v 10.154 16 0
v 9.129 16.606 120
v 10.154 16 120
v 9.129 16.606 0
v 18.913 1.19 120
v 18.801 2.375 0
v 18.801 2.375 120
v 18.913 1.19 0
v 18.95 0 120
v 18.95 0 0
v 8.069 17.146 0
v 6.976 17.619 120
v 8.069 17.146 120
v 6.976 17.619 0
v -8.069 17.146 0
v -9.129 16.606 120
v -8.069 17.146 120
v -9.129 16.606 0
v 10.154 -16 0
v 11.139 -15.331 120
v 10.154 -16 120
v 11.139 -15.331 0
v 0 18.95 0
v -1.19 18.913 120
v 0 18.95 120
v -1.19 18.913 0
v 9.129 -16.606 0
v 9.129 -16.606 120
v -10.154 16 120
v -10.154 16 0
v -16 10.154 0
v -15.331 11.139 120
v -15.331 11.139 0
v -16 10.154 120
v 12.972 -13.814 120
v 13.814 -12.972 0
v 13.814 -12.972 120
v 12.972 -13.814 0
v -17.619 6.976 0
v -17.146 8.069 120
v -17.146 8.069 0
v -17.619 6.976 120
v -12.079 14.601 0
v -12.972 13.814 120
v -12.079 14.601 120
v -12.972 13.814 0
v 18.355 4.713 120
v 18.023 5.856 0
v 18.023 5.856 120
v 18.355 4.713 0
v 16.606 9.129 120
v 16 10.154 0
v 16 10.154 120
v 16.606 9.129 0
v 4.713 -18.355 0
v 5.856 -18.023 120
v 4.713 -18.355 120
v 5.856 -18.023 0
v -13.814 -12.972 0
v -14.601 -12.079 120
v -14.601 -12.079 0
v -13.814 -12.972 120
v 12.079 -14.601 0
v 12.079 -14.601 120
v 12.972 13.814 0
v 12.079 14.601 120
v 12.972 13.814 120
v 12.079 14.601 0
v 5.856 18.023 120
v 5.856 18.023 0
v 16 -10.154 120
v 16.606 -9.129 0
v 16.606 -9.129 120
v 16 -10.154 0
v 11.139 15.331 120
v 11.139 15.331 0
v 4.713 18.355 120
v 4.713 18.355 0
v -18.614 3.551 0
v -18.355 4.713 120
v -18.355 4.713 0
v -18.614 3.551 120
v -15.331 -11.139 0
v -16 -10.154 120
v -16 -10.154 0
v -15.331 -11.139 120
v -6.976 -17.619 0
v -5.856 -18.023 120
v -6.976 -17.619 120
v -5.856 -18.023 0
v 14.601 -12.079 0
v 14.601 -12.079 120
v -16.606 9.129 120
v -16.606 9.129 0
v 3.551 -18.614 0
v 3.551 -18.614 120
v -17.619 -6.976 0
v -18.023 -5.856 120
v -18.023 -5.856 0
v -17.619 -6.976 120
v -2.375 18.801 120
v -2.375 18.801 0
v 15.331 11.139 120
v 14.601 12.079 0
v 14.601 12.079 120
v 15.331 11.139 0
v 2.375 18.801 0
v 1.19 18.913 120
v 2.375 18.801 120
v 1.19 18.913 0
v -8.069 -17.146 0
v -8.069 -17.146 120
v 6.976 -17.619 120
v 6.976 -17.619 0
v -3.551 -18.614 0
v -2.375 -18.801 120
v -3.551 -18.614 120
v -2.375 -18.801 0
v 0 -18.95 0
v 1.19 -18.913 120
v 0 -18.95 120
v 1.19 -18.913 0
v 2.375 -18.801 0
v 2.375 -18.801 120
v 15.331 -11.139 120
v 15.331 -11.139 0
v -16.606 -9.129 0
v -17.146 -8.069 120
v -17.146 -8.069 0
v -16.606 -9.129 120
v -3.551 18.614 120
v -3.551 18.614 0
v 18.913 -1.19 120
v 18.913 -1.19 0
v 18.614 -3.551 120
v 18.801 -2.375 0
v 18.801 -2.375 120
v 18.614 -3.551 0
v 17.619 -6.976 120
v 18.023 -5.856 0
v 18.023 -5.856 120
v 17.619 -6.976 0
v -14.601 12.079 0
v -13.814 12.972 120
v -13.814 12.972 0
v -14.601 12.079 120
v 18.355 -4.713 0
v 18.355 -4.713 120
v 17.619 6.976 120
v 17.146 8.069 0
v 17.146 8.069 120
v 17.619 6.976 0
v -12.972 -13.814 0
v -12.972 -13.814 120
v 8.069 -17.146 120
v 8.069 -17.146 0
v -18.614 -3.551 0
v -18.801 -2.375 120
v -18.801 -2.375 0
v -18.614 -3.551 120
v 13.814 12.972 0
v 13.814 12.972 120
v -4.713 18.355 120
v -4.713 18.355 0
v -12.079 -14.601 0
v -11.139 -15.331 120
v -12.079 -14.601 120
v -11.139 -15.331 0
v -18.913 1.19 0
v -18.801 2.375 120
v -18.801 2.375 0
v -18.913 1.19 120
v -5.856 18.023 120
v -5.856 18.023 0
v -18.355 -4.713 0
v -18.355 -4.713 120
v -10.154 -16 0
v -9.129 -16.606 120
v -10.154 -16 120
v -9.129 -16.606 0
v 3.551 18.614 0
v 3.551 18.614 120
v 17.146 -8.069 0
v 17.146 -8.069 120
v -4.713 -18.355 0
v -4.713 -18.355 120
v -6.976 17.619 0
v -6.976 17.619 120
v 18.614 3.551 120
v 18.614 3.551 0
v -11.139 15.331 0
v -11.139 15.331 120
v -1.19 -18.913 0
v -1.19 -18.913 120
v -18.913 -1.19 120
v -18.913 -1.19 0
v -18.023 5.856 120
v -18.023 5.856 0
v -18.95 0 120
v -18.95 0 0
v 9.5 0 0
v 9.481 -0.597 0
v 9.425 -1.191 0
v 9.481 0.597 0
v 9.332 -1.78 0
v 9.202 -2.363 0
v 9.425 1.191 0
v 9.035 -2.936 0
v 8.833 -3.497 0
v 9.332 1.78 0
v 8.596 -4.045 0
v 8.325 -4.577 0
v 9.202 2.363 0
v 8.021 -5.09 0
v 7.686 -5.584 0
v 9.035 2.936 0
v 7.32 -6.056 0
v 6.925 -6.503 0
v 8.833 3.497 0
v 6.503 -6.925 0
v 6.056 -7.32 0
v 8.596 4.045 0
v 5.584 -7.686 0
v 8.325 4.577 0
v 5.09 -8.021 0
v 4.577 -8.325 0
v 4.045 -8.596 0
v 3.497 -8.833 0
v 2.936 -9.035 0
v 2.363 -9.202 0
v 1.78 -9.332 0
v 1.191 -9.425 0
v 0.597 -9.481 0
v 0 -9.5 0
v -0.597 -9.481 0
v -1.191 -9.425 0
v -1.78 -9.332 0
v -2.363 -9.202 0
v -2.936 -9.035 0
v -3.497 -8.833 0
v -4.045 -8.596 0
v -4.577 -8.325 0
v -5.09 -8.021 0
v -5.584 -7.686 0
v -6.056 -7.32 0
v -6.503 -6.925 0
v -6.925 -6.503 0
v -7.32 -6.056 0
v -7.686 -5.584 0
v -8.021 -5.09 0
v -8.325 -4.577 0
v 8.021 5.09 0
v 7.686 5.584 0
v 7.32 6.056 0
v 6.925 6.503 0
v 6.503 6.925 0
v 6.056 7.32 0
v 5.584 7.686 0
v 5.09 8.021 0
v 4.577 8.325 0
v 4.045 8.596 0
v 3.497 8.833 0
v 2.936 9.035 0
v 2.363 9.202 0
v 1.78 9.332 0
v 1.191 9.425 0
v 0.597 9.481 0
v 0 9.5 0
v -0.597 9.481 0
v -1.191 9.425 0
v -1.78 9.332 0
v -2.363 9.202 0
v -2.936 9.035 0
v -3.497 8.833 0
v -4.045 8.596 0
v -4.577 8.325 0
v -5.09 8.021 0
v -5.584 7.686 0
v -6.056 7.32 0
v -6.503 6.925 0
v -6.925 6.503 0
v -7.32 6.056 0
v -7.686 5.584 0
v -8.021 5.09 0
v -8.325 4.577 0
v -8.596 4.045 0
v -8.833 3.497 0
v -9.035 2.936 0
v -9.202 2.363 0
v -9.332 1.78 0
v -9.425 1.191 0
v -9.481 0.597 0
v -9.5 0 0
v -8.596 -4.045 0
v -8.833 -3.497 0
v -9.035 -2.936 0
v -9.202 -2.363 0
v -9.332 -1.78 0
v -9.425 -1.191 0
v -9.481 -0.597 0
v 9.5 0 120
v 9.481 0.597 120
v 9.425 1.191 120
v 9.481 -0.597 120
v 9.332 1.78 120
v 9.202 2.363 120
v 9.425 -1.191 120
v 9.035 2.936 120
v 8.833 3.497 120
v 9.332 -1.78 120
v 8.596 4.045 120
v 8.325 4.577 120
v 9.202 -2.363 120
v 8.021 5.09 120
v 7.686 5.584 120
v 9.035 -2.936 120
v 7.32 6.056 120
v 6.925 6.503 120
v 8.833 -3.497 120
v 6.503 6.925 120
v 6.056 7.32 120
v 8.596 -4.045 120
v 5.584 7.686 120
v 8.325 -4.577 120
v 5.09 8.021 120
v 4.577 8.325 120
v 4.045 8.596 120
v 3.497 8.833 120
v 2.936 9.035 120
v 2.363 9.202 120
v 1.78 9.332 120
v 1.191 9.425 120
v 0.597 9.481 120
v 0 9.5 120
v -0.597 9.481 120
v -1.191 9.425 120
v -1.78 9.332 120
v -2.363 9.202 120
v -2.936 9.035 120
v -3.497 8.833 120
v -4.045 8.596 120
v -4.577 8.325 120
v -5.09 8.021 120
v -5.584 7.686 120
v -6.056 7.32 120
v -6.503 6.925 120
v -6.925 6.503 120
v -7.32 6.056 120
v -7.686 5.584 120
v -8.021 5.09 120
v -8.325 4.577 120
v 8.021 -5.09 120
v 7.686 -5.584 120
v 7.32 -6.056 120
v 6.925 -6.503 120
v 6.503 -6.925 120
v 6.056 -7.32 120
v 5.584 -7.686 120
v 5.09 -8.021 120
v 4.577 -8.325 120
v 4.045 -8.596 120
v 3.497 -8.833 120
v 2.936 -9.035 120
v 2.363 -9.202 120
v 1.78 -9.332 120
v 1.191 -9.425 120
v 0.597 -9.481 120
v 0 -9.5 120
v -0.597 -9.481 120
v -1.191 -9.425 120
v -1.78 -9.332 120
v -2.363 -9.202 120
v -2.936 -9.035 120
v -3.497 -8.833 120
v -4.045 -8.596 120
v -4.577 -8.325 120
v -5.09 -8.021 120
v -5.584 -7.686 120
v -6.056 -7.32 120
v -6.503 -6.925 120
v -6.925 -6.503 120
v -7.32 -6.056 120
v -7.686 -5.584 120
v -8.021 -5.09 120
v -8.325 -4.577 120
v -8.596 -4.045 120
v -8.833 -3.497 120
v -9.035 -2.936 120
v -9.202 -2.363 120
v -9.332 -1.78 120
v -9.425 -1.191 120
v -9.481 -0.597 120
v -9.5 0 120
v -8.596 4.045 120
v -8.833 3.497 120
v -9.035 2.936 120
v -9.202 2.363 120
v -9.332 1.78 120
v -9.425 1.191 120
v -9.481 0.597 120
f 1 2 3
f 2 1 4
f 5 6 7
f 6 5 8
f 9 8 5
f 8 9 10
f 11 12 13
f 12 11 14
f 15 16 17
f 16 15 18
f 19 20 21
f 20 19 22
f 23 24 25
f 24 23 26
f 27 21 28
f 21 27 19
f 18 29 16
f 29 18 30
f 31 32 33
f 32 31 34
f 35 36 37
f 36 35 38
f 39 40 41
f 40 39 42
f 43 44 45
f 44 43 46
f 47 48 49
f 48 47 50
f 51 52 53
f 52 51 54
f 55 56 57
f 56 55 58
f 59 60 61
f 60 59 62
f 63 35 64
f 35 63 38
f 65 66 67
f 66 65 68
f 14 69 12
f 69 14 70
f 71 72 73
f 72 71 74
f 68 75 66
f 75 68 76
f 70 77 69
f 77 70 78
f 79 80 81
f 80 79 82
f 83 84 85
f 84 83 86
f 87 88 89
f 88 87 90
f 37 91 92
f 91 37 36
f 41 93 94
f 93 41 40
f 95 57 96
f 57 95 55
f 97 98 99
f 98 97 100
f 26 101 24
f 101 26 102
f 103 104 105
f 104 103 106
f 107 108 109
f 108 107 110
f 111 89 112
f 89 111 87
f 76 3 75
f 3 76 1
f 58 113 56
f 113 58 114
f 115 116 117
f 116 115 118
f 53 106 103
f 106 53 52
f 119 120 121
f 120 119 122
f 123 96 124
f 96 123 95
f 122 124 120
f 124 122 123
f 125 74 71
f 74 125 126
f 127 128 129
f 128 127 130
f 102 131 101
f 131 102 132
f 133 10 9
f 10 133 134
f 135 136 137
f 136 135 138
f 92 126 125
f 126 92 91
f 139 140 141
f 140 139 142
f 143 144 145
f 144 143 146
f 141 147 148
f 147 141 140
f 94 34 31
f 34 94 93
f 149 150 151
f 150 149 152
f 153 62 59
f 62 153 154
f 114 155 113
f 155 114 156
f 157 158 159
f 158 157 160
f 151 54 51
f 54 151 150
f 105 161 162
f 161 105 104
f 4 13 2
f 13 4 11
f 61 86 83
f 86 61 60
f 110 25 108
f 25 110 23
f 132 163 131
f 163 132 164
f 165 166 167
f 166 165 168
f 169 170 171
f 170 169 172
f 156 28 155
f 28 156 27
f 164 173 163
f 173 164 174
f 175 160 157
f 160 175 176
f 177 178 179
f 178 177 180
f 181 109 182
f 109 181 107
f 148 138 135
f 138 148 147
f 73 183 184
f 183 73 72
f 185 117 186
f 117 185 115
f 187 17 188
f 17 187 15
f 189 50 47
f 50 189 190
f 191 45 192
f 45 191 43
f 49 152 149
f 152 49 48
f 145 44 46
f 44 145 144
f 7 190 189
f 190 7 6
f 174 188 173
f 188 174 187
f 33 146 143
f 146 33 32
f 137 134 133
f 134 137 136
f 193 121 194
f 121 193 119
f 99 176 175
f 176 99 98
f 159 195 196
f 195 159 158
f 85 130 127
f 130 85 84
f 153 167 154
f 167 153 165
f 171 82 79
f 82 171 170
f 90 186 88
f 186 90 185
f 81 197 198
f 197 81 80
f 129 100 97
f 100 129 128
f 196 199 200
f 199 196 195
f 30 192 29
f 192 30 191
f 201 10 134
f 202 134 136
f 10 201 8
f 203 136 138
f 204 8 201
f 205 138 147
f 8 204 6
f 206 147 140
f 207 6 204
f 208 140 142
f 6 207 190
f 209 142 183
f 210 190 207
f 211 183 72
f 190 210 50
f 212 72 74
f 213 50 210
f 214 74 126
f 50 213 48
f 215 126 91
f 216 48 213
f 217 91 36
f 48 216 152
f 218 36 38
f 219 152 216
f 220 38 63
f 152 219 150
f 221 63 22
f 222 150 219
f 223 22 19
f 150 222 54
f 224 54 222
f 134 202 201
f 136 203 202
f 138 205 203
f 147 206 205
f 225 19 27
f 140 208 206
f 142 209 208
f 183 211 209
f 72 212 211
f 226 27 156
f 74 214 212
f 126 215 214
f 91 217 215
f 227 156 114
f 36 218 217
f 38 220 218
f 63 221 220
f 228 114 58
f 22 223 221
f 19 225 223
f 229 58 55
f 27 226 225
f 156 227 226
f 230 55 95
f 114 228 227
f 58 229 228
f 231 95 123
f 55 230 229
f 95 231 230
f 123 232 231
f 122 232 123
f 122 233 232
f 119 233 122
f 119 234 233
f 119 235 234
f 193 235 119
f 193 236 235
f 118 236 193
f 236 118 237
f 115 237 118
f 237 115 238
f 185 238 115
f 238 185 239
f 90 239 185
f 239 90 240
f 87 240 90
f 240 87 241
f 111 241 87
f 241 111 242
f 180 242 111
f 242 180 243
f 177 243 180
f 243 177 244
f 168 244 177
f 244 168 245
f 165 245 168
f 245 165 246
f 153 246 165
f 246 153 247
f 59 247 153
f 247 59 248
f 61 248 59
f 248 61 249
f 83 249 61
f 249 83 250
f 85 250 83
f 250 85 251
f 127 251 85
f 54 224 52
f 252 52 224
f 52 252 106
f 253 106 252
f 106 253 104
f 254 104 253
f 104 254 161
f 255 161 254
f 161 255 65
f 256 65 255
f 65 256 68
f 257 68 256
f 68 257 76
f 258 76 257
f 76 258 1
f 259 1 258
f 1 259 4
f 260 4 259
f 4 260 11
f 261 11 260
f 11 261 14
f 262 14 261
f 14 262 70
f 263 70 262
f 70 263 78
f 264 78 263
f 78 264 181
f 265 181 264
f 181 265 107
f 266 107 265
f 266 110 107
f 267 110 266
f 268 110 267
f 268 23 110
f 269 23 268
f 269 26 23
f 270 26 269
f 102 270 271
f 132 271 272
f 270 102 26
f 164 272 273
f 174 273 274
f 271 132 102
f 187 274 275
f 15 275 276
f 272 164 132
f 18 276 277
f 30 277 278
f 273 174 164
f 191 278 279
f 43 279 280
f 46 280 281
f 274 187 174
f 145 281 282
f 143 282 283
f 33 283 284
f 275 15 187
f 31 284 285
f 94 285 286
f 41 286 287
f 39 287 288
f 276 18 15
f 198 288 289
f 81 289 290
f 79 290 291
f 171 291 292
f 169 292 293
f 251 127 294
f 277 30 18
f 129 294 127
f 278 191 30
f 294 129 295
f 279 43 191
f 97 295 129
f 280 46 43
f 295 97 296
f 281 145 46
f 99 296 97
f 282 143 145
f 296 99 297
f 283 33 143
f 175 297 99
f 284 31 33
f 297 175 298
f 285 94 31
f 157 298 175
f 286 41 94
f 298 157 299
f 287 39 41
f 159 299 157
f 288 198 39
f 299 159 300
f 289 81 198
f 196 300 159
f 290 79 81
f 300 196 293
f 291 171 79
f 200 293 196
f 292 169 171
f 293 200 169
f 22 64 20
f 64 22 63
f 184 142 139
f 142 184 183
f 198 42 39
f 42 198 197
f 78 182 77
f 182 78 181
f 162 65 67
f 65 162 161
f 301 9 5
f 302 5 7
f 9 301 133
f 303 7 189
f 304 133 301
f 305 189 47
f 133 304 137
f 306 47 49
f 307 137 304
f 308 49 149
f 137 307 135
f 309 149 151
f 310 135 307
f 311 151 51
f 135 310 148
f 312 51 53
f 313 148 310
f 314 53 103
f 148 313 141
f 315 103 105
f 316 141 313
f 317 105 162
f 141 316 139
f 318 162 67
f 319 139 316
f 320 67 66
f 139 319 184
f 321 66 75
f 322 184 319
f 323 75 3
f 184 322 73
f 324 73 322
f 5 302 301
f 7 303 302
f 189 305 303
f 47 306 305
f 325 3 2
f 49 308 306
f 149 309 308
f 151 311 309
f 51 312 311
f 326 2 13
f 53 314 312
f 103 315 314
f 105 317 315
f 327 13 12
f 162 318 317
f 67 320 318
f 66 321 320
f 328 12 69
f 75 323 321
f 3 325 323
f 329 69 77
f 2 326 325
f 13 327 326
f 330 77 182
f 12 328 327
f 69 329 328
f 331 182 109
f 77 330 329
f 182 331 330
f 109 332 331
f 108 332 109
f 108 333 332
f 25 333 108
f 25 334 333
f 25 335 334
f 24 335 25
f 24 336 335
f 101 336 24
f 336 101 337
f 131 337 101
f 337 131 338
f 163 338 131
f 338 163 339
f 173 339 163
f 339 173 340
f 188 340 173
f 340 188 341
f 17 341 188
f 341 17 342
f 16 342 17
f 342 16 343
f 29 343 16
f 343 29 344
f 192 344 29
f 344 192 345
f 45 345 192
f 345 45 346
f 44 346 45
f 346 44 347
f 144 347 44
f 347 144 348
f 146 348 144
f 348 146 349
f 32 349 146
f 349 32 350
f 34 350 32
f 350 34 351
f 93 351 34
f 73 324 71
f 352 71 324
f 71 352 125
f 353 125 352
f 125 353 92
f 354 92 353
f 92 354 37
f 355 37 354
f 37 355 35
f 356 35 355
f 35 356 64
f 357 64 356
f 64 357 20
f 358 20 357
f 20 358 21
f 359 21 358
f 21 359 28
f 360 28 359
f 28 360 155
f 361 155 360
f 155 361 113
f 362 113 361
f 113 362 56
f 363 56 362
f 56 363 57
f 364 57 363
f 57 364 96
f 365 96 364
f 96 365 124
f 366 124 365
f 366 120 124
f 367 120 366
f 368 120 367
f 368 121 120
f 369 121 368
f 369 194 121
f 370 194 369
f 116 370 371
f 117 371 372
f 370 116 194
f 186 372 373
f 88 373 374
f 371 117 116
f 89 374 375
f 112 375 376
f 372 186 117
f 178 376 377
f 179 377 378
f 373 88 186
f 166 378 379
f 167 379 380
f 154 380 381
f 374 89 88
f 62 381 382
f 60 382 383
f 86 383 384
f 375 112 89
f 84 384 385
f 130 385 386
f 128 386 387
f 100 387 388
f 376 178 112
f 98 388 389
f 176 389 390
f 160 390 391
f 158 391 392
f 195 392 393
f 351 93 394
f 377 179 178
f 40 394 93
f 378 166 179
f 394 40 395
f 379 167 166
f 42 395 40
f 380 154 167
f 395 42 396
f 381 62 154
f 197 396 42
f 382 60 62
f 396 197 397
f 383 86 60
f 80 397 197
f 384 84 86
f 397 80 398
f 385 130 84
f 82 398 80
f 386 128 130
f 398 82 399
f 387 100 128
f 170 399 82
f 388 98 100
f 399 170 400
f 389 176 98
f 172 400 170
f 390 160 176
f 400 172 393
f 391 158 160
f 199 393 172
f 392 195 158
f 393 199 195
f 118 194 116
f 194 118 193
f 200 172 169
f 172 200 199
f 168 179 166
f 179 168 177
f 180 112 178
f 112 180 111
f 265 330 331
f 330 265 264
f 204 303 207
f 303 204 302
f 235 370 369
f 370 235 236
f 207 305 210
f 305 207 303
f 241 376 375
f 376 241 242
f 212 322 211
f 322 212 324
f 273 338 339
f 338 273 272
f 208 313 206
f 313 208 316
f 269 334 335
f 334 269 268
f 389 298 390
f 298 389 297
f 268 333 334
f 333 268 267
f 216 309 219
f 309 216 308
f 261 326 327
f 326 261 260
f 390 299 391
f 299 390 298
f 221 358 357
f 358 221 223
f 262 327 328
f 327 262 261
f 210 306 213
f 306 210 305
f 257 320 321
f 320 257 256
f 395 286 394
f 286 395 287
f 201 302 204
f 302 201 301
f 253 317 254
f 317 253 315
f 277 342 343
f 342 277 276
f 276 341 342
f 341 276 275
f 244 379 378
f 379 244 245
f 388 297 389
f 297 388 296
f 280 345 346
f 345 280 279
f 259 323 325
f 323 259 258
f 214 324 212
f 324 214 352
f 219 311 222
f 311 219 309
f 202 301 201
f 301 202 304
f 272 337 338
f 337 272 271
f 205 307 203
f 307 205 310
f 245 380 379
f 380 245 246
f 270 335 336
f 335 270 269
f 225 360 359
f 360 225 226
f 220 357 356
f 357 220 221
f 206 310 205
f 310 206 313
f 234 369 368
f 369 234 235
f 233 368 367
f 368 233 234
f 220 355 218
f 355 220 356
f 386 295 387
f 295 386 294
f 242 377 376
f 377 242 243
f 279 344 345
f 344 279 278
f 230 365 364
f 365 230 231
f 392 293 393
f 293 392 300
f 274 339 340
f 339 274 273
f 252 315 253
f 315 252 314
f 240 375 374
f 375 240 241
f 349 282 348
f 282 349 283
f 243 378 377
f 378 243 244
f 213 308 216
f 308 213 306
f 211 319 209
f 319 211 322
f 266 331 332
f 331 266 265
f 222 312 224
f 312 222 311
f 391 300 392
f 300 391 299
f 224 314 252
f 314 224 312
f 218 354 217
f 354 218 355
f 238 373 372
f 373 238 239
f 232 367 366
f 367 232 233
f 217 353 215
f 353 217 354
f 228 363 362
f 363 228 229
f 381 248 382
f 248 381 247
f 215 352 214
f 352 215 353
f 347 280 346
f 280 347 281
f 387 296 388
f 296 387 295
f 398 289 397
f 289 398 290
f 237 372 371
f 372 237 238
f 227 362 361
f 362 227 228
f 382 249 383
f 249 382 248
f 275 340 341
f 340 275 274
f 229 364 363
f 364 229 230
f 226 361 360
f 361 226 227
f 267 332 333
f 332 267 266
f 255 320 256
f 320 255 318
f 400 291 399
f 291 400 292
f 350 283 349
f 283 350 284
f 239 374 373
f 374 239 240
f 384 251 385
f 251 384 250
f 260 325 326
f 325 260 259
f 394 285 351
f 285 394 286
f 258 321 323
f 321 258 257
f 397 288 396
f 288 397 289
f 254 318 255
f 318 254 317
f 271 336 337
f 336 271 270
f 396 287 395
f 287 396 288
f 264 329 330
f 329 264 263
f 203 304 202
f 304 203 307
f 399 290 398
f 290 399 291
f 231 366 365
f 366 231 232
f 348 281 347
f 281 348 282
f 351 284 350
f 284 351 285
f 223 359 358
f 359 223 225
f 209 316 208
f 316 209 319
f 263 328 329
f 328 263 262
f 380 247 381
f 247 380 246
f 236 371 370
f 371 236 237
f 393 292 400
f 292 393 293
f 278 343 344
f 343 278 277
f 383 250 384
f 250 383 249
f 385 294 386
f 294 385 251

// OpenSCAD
// [FL_INDEX: keywords="openscad, 3d_parametric, Hollow_cylinder_for_filament_holder_made_with_a_stand, csg_solid" | COT="Parametric OpenSCAD design from 3DCodeverse"]
// Title: Hollow cylinder for filament holder made with a stand

/* Cylinder with a hole

To slide onto a horizontal bar of a retort stand (aka "chemistry"
stand) so that the filament roll will turn more easily.  You also can
use this to augment various filament holders and stands made from
filament.

Made by Daniel K. Schneider, TECFA, University of Geneva, August 2012, revised Feb 2016
Licence: Freeware

A hollow cylinder is defined by 5 parameters. It's length, the
diameter of the hole, the outside diameter, extra space added to the
hole diameter and extraspace substracted from the outer diameter.

Measure the diameter of the bar (typically 12mm for a retort stand)
and of the holes of your filament rools.  Use these measures as such,
but you can ajust "extraspace_diameter = 0.25;" and "extra_space" inner.

Adapt parameters if needed.

Hole diameter is 1.2 for a typical retort stand

Filament roll hole diameters seem to vary from 19 to 74 mm. Frequent
ones are 31mm, 39mm and 52mm. Outersize diameter ranges from 12.5cm
(e.g. Taulman T-glase) to 30cm. Typical outer width (length of the
cylinder to print) is from 6cm to 12.5cm. Below the ones that I
printed.

// cylinder_diameter = 31.6; // 
// cylinder_diameter = 38.3; // 
// cylinder_diameter = 50.9; // 

Adjust the length. Add extraspace, e.g. 4cm.

*/


// Diameter of the hole 
hole_diameter = 17; // 

// Extra inner space added to hole diameter
extraspace_hole = 1;

// Diameter of the cylinder (hole of filament roll)
cylinder_diameter = 38.3;

// Outer extra space subtracted from diameter
extraspace_diameter = 0.2;

// Cylinder length
length = 120;


translate ([0,0,length/2]) {
  difference() {
    cylinder (h = length, r=cylinder_diameter / 2 - extraspace_diameter, center = true, $fn=100);
    # cylinder (h = length+2, r=hole_diameter / 2 + extraspace_hole, center = true, $fn=100);
  }
}
